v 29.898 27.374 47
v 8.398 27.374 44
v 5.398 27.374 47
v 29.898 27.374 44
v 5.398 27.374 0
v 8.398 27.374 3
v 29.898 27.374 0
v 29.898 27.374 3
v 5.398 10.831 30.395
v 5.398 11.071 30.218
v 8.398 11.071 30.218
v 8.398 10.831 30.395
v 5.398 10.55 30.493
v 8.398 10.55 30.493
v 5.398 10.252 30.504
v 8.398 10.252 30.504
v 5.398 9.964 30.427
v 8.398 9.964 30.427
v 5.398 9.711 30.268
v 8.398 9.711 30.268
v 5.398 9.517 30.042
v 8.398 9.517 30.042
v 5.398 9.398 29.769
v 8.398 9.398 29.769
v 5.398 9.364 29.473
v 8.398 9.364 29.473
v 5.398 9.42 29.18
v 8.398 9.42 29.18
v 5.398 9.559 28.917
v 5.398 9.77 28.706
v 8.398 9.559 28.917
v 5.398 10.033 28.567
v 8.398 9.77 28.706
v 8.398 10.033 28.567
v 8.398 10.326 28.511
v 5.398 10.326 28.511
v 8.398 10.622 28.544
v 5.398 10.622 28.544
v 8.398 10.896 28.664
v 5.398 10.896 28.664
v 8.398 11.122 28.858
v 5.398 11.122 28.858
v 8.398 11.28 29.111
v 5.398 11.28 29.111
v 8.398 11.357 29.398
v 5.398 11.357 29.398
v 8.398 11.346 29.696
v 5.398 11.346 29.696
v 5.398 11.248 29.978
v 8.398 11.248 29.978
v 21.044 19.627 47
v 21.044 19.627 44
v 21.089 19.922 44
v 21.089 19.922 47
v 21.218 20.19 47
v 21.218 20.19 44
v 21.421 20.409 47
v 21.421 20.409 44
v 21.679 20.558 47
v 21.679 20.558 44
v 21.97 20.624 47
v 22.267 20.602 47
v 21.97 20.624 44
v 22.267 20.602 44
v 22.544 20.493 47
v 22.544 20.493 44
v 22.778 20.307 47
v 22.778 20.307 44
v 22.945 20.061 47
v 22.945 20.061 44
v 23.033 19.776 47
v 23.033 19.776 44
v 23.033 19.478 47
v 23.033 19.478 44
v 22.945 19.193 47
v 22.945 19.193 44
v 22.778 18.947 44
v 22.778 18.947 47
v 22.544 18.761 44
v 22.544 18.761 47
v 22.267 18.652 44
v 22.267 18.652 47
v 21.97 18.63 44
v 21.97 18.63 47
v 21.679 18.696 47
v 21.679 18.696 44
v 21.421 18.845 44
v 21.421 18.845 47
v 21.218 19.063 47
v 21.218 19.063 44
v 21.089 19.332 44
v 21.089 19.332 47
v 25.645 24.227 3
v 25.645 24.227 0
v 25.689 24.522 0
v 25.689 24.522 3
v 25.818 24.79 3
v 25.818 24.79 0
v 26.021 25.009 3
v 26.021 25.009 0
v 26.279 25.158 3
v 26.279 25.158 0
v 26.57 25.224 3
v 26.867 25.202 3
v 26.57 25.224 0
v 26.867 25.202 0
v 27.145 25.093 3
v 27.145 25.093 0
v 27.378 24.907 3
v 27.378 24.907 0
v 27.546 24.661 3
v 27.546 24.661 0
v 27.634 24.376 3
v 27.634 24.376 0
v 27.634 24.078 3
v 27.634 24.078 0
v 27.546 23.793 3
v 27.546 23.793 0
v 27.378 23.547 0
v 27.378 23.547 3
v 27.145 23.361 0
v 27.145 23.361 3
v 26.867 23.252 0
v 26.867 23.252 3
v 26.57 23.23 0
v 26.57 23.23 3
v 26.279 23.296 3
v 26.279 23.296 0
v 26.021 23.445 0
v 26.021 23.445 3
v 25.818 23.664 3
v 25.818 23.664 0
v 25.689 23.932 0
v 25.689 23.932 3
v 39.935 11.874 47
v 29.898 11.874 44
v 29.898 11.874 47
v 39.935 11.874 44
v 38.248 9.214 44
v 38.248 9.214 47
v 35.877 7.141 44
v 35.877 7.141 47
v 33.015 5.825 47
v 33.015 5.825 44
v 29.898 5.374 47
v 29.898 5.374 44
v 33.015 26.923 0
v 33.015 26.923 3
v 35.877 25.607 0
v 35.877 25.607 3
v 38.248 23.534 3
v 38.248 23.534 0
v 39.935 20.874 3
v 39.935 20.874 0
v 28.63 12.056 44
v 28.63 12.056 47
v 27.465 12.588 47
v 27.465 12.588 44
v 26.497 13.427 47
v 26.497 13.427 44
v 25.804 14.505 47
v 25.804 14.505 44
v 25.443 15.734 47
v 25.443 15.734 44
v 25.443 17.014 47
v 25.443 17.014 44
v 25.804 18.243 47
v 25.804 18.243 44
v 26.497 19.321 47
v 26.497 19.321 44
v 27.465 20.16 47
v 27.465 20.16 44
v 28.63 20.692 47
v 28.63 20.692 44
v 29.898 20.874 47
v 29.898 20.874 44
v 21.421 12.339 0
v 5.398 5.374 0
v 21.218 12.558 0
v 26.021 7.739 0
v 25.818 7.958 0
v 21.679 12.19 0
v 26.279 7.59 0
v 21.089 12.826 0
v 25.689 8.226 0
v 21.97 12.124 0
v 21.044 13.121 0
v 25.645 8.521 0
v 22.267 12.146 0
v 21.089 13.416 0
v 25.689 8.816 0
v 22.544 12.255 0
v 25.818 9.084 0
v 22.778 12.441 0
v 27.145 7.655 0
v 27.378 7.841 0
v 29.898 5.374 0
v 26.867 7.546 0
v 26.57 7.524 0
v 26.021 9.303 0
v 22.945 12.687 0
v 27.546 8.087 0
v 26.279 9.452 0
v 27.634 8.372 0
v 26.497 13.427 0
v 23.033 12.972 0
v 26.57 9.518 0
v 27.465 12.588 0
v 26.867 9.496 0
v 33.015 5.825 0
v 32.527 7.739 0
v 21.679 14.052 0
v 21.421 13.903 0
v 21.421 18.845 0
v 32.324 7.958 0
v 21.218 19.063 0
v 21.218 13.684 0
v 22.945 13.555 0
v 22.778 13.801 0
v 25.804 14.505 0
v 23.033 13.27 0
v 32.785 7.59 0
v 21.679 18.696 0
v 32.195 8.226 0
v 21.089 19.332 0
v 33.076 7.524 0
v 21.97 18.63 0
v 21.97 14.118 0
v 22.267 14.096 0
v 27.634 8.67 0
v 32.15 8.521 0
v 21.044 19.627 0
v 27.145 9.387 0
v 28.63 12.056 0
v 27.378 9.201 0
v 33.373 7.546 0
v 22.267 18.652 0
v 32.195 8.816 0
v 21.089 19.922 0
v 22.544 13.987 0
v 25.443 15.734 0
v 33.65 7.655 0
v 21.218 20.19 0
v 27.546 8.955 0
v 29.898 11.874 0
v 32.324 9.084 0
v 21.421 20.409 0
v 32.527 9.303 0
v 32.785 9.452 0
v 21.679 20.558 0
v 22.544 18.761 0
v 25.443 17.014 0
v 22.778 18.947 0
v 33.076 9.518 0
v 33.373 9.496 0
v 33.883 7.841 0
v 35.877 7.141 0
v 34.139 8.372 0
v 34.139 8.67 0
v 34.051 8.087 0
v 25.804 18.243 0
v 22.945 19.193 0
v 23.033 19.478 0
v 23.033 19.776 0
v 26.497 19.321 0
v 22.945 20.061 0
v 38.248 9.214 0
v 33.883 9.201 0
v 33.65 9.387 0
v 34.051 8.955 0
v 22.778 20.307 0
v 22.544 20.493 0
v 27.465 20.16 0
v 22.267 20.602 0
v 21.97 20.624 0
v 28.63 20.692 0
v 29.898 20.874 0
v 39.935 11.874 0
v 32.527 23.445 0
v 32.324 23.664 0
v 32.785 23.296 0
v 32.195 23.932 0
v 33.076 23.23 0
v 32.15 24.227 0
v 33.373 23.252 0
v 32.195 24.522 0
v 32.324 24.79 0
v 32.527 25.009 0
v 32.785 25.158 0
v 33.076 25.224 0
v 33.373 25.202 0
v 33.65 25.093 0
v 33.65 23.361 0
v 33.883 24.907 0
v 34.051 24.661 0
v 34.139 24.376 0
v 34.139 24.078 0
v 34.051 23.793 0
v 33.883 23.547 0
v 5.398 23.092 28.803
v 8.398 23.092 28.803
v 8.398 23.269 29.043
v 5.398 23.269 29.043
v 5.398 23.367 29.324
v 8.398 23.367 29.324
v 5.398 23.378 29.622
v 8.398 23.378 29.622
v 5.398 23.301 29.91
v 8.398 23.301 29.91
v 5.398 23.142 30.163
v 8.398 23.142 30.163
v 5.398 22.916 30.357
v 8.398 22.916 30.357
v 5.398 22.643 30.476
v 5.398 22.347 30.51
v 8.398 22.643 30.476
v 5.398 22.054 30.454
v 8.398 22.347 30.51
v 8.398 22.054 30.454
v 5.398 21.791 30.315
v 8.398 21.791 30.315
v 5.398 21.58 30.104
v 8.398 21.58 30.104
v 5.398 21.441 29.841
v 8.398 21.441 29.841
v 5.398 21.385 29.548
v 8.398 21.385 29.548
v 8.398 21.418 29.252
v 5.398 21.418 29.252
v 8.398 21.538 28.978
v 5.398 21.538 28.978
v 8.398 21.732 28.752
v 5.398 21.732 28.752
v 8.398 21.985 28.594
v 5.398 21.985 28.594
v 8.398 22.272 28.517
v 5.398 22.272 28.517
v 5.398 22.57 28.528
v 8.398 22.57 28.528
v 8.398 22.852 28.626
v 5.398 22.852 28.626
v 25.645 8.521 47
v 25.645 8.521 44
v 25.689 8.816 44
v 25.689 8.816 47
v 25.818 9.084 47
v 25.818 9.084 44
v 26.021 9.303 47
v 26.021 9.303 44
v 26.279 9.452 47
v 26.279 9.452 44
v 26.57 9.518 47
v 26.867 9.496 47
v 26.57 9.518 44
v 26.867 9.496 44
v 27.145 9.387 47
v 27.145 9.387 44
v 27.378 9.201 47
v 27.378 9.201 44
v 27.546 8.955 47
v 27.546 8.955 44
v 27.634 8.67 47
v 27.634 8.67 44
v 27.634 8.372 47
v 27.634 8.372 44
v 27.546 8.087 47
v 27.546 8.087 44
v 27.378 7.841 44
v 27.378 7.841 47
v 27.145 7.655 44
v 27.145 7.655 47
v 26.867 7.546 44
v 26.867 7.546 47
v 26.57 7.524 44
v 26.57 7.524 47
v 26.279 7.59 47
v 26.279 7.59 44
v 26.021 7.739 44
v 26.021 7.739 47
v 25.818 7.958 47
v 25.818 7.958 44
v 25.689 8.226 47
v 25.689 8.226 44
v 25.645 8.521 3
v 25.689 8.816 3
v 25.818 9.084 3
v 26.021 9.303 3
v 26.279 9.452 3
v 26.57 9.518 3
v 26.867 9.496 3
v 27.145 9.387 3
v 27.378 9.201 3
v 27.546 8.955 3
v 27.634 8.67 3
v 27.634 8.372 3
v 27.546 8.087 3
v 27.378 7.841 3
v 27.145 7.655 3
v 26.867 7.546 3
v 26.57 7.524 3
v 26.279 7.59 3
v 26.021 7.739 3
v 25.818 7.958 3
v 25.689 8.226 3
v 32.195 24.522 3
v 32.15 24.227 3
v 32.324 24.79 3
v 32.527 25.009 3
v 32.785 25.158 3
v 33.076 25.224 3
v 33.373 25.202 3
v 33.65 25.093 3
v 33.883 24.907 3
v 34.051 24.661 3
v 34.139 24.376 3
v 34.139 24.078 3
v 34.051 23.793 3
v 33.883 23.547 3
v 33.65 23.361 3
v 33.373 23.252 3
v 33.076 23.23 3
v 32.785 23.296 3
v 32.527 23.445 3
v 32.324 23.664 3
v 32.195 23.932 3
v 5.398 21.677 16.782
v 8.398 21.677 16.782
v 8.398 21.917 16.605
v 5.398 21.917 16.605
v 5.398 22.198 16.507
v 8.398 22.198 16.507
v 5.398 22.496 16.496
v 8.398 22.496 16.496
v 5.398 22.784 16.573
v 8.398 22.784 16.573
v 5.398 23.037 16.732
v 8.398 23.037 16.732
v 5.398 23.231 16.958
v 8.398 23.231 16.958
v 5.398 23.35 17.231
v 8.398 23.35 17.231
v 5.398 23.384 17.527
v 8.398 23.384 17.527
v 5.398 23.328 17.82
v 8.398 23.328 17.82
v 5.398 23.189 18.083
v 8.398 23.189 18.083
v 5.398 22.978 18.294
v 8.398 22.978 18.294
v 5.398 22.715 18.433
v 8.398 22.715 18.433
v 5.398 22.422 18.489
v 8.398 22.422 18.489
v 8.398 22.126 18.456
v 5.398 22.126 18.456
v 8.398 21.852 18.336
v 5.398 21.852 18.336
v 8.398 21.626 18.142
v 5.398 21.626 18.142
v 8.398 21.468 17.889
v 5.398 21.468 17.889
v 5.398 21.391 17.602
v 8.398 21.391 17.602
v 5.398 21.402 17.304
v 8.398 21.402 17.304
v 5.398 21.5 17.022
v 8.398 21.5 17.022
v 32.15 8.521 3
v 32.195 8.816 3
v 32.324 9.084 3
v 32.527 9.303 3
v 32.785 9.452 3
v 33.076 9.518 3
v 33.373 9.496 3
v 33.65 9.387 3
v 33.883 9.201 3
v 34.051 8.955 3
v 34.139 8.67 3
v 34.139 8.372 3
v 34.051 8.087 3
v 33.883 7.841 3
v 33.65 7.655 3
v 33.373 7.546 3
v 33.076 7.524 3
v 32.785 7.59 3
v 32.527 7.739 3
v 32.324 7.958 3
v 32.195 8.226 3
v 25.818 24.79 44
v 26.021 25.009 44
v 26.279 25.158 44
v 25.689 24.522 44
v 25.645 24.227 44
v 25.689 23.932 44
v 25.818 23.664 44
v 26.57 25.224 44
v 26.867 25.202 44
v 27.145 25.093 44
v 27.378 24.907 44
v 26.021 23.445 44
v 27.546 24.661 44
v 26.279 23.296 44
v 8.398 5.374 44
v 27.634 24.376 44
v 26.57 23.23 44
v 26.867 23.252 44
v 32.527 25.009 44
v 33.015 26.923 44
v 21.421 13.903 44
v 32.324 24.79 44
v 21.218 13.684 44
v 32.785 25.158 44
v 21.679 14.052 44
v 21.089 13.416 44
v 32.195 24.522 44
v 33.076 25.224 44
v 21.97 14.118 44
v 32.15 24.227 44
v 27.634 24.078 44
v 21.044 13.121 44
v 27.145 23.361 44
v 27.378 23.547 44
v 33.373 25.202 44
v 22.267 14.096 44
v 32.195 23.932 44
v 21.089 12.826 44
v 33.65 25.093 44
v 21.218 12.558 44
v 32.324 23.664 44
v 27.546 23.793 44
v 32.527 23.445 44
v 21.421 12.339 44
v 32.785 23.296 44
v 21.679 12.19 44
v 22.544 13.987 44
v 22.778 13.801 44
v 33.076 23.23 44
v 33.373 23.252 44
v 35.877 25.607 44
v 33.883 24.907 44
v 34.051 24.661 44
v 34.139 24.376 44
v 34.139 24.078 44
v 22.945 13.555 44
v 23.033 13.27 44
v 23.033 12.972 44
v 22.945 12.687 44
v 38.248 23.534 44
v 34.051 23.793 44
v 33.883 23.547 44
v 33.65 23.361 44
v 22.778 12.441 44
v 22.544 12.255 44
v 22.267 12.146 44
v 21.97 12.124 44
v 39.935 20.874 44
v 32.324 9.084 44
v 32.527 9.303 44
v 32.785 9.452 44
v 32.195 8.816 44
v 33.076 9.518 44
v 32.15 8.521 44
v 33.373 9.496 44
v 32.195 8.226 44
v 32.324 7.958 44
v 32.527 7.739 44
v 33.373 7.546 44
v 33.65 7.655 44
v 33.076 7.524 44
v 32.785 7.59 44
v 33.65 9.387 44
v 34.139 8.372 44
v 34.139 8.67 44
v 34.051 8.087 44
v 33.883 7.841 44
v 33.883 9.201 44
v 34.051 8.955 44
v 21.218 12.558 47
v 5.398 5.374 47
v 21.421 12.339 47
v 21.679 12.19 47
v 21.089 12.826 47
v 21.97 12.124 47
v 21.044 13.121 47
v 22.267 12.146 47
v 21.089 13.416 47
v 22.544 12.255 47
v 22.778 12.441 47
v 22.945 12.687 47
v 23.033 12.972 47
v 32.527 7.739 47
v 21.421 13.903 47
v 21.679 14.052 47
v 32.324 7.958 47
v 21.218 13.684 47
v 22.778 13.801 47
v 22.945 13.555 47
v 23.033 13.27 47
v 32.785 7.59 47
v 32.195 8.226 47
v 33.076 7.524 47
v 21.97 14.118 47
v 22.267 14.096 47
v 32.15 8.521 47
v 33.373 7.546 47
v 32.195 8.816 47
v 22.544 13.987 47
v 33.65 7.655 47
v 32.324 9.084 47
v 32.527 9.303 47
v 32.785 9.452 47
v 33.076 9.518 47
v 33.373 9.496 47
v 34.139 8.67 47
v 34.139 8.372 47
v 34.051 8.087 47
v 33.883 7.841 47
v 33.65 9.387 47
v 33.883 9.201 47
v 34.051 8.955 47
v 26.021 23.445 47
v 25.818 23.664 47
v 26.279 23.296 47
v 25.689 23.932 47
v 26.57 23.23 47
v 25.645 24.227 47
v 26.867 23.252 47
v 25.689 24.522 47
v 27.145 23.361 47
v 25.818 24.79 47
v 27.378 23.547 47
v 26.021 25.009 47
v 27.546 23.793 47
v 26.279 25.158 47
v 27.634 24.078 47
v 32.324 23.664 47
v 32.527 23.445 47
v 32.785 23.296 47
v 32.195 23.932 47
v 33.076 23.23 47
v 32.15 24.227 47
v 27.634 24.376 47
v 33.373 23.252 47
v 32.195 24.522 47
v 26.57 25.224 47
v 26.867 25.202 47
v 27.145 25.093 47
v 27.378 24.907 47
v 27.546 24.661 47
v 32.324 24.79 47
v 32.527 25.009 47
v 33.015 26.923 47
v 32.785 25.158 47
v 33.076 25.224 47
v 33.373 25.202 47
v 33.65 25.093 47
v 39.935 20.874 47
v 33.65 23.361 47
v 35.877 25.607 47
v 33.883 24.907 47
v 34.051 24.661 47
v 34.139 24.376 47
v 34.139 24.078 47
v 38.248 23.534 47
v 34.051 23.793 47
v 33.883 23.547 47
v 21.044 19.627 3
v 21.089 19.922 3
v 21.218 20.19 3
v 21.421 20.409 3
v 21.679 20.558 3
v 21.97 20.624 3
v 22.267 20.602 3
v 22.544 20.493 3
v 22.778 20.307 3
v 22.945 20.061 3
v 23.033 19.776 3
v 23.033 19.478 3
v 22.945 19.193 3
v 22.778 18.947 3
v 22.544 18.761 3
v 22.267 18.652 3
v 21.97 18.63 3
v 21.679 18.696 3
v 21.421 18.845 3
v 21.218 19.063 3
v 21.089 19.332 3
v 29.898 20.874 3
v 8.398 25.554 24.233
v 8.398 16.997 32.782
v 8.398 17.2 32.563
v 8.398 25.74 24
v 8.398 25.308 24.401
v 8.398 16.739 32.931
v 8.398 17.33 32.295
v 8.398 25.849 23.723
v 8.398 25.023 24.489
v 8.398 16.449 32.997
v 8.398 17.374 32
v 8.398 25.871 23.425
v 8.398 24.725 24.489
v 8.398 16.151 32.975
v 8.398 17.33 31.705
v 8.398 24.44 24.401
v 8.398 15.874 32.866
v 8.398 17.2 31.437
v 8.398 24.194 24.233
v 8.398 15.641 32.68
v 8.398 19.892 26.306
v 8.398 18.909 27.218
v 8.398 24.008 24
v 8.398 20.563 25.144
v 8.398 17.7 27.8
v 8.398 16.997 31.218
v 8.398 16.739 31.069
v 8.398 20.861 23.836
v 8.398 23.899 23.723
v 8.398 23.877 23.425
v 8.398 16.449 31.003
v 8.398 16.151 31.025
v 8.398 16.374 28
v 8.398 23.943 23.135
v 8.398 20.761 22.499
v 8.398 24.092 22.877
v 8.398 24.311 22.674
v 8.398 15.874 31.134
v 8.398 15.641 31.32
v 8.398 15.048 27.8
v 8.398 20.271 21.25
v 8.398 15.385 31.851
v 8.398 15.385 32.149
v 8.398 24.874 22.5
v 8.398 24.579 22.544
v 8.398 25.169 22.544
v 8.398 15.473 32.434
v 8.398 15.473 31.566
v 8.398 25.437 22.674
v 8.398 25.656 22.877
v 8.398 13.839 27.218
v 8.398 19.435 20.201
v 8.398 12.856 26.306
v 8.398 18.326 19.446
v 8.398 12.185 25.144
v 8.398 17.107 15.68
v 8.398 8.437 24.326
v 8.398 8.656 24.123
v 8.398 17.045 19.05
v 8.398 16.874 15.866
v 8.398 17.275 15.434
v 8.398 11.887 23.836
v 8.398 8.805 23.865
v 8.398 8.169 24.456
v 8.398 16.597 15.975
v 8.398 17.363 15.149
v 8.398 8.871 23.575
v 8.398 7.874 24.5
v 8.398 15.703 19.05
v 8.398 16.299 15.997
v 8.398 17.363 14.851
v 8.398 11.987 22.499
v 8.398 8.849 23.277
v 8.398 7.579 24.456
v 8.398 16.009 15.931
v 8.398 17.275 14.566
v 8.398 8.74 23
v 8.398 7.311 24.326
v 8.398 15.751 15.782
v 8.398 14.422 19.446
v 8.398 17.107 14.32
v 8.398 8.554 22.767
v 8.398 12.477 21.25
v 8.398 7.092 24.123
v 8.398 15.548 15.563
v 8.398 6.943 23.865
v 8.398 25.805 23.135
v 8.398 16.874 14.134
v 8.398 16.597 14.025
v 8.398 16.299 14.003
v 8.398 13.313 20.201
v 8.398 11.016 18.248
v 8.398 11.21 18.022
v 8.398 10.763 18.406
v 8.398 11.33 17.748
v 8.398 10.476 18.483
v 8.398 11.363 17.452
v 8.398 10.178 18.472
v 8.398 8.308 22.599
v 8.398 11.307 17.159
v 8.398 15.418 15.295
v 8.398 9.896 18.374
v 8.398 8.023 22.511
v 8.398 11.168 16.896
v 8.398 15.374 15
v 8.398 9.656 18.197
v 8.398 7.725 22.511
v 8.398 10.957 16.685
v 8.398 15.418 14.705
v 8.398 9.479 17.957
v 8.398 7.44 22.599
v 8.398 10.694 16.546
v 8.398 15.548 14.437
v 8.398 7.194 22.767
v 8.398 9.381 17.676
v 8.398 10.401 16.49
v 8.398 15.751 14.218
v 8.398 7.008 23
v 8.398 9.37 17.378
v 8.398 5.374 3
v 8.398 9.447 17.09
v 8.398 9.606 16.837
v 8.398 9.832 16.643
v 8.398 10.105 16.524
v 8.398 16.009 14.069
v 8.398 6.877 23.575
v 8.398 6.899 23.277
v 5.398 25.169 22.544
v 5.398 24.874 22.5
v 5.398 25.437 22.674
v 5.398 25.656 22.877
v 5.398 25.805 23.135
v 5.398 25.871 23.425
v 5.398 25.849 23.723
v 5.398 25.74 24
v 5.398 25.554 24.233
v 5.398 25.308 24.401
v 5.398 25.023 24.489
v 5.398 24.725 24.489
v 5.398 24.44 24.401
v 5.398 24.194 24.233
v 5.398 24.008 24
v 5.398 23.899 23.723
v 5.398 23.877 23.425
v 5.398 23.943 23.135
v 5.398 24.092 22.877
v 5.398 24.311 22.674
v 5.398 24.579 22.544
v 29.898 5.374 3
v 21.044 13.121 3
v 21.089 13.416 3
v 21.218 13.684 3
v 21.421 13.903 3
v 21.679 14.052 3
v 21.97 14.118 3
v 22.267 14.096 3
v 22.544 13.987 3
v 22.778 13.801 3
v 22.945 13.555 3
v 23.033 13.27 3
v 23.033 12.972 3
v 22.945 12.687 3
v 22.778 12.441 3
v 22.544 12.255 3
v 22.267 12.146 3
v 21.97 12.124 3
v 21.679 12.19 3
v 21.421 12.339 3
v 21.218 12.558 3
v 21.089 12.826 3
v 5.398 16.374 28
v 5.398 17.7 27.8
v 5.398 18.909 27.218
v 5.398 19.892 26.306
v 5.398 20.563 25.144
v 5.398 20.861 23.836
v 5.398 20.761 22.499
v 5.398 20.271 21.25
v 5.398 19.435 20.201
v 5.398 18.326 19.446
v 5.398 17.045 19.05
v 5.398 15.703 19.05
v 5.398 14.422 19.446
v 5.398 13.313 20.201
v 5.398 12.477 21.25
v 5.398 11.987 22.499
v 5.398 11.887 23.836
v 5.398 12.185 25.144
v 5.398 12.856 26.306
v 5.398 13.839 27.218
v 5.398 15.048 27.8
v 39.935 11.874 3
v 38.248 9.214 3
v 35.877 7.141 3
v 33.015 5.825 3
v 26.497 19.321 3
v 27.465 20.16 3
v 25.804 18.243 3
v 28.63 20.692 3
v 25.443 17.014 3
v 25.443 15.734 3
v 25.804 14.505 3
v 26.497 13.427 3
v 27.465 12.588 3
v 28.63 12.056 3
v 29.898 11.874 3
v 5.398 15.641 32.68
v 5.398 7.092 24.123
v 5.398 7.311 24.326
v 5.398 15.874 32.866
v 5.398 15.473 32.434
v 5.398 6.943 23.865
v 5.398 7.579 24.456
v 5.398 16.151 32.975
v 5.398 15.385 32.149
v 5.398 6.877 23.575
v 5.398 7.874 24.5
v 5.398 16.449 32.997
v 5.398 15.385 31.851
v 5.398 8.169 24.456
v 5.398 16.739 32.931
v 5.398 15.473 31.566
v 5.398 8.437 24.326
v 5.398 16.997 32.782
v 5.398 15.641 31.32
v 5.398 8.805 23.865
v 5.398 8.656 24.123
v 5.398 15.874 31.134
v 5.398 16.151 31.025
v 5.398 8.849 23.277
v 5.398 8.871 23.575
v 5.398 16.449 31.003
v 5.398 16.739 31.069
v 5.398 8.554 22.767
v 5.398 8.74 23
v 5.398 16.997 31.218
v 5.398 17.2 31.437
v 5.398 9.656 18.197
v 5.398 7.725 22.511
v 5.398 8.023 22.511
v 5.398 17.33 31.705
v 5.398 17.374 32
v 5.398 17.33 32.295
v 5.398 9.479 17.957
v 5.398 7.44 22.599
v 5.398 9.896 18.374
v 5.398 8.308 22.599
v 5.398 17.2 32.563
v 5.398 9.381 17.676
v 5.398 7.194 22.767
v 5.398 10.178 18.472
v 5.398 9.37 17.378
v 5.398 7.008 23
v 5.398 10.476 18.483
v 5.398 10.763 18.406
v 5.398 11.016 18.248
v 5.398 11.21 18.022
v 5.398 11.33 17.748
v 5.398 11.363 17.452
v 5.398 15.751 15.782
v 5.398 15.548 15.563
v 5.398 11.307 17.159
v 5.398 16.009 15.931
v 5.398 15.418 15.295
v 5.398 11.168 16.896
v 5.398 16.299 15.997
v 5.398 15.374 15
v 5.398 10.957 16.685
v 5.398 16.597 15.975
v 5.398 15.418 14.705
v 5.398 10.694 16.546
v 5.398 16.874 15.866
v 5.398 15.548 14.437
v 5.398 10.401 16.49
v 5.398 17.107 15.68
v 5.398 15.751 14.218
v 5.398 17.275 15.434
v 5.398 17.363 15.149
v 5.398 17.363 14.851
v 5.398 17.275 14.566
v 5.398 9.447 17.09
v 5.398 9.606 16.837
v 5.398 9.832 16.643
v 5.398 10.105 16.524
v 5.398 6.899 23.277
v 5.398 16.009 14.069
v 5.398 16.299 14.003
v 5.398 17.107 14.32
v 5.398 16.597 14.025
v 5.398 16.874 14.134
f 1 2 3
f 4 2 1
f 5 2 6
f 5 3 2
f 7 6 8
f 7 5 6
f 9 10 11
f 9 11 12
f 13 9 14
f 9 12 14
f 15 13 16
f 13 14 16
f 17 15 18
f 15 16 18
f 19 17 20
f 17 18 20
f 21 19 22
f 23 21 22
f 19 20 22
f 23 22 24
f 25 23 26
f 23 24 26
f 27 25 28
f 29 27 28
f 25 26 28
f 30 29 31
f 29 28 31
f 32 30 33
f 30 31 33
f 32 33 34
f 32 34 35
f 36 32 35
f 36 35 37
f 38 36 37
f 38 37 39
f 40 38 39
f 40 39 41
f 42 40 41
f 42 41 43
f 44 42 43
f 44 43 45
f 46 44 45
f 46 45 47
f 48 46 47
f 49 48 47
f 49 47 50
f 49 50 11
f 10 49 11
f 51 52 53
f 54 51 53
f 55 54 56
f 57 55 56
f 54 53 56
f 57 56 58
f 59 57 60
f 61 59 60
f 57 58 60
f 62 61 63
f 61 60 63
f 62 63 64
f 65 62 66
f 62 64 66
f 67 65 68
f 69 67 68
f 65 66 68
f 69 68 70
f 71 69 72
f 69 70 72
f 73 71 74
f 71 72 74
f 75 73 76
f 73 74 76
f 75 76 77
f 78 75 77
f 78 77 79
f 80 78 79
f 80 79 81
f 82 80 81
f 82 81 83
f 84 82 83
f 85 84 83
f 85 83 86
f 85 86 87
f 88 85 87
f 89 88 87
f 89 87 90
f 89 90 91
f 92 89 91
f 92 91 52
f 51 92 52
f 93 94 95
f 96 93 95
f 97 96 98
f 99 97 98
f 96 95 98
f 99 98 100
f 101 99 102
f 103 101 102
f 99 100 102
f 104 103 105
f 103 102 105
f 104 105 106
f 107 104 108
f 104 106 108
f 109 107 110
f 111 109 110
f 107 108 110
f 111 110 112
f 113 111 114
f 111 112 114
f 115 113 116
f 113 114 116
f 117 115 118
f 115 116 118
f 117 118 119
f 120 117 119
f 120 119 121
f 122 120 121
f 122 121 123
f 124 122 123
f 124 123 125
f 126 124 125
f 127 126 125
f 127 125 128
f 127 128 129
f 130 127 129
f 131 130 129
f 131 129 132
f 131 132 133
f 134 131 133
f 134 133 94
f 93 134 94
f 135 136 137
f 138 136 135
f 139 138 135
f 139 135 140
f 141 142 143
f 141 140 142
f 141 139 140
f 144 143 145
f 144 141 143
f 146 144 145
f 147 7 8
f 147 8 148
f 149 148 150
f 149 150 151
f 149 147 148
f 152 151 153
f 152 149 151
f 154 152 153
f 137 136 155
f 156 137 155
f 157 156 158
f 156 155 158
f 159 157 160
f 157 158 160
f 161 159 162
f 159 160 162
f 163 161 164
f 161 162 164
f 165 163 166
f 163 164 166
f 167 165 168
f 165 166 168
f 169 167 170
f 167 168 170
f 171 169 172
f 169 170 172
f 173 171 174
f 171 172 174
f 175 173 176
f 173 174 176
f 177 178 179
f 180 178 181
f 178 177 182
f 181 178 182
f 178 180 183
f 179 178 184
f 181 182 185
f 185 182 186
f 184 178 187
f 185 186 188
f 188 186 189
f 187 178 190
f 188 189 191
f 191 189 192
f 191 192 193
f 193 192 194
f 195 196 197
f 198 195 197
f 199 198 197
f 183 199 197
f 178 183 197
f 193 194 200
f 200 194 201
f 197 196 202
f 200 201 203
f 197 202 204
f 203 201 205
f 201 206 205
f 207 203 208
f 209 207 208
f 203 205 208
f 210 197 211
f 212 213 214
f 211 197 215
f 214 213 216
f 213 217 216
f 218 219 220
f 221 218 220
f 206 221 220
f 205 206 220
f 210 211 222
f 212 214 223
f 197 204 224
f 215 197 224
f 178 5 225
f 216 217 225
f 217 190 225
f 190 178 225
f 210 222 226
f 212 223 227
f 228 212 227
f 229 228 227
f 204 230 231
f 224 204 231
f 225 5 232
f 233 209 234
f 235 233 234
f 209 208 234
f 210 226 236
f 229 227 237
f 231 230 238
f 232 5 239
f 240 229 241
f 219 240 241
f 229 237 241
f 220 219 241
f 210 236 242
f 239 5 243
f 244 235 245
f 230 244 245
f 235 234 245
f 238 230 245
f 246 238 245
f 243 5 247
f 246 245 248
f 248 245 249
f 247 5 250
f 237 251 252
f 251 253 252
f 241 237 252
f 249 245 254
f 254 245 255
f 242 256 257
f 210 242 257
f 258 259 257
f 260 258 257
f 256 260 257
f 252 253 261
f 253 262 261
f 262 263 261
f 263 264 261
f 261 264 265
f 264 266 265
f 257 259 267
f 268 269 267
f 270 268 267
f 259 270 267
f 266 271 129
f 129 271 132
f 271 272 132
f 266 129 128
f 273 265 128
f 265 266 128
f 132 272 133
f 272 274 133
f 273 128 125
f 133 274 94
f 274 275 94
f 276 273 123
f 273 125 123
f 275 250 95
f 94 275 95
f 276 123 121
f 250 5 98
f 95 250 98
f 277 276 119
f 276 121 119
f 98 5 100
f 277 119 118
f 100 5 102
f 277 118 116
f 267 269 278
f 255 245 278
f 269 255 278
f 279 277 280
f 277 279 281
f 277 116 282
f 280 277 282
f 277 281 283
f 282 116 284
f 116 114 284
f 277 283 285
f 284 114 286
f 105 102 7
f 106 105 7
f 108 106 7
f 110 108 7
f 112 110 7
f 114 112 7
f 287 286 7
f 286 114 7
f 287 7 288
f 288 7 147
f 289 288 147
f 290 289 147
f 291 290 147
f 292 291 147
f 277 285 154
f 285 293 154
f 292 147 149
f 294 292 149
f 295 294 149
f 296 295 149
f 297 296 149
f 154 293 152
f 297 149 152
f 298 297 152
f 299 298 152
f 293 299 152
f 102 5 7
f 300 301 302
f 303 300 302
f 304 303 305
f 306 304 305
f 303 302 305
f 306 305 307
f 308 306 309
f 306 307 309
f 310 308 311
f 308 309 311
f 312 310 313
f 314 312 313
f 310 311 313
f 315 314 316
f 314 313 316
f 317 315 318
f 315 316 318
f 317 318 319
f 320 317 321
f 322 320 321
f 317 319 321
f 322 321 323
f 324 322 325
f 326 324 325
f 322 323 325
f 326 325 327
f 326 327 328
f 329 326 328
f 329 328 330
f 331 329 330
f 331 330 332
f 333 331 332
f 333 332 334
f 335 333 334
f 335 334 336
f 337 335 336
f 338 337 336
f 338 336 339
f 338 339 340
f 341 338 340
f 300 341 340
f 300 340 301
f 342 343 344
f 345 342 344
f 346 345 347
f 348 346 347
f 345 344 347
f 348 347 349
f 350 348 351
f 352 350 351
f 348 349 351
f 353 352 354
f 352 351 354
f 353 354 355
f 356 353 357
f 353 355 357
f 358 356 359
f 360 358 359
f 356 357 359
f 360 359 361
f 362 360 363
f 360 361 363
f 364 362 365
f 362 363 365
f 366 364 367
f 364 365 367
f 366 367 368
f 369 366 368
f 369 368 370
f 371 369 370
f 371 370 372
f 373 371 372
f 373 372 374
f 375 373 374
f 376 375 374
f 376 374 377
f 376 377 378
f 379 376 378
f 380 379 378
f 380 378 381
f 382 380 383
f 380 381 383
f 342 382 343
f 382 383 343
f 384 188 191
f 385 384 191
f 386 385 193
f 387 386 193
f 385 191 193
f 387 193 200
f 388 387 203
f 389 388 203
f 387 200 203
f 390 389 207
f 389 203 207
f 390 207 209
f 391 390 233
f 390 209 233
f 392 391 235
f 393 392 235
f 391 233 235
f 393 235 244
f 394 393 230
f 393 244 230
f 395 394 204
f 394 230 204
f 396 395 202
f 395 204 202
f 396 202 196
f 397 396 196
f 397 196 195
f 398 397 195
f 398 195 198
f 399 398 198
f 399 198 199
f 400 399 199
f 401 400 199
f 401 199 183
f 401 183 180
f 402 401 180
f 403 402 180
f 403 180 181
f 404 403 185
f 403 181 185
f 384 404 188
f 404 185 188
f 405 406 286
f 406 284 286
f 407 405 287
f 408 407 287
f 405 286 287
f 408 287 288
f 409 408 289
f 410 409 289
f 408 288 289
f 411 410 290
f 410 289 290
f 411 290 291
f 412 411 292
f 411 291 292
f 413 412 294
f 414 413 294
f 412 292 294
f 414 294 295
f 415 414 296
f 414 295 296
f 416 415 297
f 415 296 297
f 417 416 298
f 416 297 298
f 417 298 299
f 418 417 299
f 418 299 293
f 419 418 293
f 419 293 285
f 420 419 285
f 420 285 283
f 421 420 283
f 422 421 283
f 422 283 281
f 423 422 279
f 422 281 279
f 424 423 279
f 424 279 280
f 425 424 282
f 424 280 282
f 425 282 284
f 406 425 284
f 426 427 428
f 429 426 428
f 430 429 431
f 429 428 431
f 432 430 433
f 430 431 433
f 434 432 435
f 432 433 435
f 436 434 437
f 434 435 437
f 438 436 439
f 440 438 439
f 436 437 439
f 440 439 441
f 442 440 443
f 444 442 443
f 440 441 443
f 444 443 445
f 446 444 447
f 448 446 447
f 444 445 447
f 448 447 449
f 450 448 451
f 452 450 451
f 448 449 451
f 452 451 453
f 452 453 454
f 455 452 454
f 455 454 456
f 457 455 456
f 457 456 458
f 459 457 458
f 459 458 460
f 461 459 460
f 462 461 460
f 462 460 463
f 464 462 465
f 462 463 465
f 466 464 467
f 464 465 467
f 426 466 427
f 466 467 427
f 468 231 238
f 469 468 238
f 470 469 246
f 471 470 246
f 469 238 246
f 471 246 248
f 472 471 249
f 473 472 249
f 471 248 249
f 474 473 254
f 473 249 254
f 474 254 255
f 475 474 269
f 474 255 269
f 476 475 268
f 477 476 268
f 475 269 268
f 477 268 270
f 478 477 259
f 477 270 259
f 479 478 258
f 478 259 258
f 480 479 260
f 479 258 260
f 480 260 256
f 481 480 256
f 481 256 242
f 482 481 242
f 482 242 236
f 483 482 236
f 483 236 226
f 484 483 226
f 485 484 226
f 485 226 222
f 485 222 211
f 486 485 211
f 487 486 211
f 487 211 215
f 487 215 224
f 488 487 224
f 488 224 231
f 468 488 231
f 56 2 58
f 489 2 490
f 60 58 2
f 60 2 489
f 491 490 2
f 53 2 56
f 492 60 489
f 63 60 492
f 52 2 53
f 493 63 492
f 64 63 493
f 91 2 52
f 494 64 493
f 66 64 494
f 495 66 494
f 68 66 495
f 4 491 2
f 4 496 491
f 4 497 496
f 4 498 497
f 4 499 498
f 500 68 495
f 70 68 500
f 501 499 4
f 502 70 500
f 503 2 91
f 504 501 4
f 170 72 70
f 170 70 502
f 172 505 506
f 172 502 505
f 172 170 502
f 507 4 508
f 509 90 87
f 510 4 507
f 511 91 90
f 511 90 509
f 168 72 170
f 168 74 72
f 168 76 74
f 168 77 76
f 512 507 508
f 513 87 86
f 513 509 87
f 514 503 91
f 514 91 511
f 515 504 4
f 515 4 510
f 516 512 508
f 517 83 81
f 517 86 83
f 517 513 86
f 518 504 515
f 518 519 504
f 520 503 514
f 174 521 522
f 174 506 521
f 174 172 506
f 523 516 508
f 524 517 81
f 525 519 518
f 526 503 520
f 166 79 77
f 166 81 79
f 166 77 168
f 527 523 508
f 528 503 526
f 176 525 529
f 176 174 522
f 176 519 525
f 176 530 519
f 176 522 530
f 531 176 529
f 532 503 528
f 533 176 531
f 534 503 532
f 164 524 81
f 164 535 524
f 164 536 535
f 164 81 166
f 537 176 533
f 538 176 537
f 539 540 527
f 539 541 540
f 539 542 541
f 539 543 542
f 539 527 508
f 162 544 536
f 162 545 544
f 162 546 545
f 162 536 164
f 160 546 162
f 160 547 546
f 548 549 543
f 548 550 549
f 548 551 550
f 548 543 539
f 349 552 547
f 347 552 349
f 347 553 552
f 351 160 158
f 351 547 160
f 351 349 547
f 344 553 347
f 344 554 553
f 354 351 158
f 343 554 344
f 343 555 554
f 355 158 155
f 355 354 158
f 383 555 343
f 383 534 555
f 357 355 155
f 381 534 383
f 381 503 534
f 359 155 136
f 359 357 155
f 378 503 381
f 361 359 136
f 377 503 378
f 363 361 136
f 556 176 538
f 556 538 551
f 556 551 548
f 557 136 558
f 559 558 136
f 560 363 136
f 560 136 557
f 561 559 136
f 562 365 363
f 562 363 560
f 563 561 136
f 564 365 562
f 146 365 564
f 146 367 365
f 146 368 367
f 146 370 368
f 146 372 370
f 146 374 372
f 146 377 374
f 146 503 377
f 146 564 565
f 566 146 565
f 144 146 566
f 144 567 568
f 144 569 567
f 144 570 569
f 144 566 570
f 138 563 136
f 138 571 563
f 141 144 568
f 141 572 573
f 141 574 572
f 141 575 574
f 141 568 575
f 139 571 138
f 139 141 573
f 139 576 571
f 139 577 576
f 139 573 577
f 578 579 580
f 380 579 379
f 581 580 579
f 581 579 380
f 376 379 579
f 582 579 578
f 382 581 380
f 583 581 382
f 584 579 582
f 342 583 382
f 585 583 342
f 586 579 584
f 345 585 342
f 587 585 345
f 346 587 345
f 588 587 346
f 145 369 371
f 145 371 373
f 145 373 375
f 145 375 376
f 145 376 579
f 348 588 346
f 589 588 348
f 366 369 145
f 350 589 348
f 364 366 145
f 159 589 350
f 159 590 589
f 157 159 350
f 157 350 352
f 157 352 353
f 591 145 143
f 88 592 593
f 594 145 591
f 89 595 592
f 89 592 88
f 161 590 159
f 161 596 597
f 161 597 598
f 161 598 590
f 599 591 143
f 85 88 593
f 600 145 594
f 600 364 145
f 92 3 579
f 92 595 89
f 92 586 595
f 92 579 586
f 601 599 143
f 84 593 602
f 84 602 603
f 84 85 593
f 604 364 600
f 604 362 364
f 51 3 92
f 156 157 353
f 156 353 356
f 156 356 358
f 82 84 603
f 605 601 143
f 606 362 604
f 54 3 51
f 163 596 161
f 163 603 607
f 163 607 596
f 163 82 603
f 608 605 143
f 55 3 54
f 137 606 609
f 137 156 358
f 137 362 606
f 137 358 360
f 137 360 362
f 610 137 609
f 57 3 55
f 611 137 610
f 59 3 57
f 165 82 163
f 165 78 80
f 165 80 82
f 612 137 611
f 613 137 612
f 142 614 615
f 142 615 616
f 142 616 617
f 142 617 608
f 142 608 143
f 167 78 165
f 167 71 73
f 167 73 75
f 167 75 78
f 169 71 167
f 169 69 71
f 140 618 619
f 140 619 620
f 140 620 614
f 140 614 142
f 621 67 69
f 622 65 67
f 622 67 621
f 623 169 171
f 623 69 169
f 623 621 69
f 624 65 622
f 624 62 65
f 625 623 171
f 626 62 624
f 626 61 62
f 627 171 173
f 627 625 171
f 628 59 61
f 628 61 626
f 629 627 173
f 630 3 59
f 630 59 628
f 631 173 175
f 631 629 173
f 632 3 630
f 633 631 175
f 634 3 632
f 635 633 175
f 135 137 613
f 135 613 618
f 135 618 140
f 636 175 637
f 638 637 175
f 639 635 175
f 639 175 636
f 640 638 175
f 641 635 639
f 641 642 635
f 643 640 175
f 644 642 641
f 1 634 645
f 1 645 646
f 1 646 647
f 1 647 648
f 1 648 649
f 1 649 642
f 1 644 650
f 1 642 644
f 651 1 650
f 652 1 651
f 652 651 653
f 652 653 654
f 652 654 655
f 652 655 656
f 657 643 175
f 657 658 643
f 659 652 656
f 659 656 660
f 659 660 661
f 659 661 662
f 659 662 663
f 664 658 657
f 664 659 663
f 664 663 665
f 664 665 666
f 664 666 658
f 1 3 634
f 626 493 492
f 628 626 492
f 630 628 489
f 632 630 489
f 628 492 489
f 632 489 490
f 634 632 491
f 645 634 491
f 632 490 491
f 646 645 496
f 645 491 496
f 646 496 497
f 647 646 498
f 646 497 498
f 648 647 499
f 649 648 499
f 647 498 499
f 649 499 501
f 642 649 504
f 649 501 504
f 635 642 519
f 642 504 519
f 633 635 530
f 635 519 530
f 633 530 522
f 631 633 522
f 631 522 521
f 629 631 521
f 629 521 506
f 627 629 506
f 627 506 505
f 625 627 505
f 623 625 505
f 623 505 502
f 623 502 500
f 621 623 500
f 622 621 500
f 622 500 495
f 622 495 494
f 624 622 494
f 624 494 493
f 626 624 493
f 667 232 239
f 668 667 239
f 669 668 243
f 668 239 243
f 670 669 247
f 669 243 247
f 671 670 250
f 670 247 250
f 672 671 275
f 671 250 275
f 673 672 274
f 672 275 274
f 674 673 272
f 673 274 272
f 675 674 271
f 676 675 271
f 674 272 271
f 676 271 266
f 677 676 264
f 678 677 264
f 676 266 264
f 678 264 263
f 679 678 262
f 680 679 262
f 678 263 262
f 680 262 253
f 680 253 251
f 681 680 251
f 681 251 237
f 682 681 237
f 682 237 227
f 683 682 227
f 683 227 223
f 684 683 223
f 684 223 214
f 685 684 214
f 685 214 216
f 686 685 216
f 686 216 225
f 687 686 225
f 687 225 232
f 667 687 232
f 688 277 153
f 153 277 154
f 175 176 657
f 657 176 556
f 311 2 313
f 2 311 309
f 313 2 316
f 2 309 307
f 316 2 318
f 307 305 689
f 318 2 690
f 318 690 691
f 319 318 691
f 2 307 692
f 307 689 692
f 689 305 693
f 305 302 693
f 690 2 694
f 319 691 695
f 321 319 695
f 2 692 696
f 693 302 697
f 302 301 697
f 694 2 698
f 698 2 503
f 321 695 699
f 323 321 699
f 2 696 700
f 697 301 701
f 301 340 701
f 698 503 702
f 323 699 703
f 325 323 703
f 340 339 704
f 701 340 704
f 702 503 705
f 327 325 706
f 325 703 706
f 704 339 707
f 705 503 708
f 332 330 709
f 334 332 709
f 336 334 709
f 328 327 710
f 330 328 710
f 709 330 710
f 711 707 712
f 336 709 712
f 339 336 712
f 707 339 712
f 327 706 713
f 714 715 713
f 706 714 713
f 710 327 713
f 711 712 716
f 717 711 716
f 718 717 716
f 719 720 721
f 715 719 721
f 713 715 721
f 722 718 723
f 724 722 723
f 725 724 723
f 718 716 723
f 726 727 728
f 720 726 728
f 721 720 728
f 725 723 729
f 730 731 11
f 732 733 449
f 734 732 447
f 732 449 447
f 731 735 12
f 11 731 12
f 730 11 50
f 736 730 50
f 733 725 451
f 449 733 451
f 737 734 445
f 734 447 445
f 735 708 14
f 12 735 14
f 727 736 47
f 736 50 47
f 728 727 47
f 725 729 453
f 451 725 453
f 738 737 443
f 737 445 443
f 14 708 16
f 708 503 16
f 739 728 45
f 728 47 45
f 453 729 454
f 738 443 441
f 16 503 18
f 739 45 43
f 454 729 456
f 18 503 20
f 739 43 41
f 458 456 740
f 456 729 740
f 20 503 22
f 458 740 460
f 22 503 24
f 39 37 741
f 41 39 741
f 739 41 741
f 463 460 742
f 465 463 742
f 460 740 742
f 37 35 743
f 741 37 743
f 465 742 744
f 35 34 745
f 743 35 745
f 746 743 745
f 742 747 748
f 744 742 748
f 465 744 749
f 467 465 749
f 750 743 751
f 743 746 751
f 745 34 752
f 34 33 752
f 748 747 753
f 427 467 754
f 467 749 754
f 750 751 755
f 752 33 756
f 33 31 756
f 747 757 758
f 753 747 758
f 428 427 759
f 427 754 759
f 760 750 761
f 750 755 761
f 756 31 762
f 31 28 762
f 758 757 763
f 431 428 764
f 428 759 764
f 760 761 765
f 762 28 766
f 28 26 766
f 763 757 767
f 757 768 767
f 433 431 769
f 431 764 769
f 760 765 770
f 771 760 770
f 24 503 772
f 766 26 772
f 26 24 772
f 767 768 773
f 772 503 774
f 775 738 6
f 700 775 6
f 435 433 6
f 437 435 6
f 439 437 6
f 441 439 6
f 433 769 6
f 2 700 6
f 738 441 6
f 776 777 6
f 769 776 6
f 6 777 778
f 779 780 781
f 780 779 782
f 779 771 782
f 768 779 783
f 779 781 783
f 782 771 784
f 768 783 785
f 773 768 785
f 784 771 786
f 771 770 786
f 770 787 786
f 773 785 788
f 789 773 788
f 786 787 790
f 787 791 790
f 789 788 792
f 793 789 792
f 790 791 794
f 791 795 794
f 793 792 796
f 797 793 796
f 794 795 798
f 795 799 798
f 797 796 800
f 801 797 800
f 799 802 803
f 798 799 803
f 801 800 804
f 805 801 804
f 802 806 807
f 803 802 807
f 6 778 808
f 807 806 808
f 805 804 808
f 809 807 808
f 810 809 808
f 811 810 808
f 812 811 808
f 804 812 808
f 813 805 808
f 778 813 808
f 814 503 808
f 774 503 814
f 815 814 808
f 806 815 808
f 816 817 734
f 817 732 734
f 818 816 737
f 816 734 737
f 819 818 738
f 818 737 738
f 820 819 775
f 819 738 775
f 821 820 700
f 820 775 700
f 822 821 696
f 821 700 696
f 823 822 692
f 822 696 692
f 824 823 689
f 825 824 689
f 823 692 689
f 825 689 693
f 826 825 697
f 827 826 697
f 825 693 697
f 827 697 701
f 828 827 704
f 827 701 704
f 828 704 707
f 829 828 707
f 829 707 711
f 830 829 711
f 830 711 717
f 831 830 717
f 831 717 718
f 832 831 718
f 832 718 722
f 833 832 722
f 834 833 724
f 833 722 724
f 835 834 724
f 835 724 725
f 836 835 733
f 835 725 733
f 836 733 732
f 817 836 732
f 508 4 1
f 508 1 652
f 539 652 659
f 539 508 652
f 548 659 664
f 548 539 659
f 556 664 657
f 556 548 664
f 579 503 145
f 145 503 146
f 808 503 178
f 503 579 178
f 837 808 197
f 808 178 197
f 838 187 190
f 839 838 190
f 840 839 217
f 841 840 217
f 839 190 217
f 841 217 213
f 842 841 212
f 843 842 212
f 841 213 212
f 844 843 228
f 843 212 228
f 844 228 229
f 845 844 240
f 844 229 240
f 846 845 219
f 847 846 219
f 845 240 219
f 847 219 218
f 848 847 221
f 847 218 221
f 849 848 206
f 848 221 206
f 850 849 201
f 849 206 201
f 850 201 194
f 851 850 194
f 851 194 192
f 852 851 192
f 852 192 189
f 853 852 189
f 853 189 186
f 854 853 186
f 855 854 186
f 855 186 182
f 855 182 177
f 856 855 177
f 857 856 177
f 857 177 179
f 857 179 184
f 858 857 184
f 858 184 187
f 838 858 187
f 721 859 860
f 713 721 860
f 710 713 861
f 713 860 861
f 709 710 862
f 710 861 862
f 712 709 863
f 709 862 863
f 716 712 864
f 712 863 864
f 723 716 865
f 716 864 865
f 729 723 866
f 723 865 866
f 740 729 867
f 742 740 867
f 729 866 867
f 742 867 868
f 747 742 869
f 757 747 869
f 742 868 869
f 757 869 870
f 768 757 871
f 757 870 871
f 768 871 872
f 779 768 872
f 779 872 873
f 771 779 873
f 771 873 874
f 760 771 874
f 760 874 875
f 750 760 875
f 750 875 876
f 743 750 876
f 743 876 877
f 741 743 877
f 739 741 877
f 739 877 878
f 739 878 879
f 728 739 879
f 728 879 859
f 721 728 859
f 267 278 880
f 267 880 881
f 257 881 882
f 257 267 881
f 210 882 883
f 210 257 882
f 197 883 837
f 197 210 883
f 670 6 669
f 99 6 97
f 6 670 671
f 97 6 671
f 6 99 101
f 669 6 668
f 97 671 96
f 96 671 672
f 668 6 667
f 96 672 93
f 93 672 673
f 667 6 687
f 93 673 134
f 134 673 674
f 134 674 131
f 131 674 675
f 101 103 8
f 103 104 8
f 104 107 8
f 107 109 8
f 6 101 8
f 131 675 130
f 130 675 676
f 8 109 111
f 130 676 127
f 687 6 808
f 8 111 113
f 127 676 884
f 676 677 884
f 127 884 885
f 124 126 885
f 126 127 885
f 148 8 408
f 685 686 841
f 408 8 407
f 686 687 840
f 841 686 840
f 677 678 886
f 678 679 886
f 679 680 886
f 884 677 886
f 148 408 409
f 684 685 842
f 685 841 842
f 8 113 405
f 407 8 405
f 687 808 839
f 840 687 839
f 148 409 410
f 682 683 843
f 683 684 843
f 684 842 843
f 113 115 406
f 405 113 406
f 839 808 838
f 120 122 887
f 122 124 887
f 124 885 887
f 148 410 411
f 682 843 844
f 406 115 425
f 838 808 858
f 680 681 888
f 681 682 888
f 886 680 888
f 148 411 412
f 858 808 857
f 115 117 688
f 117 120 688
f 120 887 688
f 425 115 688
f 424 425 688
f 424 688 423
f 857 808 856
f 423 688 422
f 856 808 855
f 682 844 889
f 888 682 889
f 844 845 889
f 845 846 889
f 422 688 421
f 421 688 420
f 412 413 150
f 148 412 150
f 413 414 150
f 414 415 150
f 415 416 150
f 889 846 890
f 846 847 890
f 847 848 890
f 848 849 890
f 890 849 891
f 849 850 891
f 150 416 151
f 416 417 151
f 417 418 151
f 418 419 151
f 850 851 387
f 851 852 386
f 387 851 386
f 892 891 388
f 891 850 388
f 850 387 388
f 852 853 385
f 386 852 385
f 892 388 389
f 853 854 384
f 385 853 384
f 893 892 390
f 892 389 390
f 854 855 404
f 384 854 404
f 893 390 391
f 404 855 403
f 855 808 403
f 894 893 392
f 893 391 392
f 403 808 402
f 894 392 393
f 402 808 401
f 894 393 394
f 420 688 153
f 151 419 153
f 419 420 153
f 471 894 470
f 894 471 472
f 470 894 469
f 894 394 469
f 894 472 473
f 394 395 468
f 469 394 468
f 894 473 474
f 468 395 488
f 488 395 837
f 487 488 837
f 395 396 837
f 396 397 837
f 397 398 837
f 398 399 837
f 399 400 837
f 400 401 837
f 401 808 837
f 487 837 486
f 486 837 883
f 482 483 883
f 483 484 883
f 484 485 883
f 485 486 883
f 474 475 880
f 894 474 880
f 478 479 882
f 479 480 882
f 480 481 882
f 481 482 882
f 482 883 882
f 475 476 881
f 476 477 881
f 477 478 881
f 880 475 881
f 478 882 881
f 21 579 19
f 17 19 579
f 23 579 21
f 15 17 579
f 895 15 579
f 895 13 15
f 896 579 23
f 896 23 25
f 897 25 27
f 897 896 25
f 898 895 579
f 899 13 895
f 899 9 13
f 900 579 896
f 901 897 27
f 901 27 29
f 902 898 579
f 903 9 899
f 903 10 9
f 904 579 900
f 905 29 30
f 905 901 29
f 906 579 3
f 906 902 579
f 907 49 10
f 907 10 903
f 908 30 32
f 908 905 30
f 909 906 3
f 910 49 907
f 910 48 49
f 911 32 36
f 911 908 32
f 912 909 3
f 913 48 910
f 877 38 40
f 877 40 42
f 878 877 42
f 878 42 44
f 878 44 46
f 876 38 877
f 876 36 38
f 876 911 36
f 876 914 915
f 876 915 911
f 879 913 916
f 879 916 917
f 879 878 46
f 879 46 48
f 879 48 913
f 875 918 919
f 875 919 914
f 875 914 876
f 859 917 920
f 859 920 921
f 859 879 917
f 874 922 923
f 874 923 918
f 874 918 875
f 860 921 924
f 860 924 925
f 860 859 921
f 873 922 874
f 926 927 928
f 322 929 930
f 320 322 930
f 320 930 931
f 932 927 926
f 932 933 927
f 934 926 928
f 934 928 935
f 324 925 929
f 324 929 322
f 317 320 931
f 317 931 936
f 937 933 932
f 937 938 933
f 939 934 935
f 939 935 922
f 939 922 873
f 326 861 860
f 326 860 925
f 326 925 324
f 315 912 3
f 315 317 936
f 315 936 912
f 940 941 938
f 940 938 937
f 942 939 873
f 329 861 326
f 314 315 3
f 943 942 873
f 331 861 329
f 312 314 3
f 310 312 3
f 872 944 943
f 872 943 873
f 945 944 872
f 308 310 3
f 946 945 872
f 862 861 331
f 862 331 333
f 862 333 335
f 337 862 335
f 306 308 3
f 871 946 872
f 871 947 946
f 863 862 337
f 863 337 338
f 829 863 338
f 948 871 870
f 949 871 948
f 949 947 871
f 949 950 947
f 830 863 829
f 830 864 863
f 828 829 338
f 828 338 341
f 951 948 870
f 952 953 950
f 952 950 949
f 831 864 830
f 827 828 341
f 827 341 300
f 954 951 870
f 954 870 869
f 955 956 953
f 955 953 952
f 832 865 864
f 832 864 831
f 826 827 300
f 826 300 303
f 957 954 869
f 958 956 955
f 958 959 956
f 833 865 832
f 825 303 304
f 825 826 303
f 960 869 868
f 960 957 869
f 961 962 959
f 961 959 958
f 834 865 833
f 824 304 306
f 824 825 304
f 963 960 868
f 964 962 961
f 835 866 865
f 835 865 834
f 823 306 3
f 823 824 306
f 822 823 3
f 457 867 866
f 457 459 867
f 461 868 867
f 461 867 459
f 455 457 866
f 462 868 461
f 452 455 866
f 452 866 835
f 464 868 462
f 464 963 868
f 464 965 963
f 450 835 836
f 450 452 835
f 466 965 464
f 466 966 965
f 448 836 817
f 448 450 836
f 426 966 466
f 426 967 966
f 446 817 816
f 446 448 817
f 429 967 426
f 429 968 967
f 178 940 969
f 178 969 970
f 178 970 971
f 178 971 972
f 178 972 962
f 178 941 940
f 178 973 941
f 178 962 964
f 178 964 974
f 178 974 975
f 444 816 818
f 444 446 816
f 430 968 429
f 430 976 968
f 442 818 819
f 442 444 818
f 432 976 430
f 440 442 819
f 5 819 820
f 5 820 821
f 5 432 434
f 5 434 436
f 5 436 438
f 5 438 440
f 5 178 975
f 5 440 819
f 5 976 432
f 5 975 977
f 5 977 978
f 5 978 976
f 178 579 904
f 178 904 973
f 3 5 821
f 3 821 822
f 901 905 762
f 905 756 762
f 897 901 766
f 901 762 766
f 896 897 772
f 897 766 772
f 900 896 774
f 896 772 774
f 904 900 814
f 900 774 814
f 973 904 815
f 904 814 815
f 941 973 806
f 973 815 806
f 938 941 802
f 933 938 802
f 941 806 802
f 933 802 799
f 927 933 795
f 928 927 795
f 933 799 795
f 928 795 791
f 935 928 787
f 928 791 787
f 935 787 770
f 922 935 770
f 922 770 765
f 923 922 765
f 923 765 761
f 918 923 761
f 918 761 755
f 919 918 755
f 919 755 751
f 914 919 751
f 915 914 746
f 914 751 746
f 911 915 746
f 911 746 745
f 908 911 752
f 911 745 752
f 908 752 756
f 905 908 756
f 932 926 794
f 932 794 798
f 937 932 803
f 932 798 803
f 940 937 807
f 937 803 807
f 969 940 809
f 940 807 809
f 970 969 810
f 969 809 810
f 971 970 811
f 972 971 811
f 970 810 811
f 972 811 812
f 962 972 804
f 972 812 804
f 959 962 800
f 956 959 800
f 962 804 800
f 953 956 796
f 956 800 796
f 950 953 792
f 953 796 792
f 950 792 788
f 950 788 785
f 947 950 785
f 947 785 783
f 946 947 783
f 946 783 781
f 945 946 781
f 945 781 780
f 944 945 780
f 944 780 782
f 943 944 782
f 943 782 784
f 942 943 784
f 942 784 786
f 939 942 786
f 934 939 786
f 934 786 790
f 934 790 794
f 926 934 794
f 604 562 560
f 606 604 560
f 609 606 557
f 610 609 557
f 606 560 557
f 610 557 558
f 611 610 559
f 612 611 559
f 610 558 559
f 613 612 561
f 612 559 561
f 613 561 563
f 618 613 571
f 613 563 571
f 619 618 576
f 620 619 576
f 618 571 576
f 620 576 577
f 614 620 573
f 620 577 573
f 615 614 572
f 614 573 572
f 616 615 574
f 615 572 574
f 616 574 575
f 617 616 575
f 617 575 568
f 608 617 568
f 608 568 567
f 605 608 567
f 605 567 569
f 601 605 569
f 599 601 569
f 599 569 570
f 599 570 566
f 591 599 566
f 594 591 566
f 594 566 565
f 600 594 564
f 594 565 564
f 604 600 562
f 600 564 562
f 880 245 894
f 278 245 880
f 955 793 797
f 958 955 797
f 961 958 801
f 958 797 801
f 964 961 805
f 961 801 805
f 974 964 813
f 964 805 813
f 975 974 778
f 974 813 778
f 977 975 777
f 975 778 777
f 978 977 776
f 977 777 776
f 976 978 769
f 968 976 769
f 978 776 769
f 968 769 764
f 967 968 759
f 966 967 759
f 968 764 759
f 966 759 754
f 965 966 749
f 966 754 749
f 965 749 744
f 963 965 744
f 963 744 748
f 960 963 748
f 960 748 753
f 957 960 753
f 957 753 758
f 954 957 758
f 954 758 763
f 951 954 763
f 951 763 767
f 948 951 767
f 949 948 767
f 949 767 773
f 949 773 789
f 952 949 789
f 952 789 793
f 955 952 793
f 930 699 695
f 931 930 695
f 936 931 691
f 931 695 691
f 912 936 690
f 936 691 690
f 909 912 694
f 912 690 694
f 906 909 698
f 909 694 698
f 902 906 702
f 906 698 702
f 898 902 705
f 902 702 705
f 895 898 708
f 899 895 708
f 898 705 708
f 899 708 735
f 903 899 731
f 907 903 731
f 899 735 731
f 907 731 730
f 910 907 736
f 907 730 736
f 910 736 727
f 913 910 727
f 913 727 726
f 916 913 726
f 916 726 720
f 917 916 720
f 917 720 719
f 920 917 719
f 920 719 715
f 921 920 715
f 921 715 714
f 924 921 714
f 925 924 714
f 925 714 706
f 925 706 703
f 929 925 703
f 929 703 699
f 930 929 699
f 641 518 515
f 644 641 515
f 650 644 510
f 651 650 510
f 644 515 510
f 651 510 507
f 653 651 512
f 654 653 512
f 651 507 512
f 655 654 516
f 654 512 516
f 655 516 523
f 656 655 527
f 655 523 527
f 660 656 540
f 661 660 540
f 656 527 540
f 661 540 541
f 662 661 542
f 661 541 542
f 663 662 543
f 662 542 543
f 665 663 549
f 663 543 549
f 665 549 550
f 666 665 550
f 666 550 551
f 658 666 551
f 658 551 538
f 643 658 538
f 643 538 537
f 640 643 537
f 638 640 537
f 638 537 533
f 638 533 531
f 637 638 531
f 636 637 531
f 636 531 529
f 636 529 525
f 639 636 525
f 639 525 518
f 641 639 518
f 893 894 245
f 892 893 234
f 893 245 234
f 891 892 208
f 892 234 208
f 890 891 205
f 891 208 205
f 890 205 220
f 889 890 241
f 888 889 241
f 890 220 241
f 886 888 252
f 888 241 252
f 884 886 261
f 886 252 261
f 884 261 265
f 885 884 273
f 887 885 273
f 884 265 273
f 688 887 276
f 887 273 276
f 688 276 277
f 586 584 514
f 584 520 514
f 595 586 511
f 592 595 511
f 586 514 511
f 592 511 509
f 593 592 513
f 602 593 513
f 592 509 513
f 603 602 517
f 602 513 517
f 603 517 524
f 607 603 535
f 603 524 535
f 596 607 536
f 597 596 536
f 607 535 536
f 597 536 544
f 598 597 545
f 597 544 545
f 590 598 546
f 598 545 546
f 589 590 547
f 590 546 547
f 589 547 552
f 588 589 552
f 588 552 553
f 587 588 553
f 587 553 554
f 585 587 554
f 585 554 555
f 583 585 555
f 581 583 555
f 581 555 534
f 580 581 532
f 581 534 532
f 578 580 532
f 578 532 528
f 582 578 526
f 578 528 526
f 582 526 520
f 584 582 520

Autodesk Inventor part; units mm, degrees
ref_plane "YZ Plane" through (0, 0, 0) normal (1, 0, 0) x (0, 1, 0)
ref_plane "XZ Plane" through (0, 0, 0) normal (0, 1, 0) x (-1, 0, 0)
ref_plane "XY Plane" through (0, 0, 0) normal (0, 0, 1) x (1, 0, 0)
sketch "Sketch1" plane through (0, 0, 0) normal (0, 0, 1) x (1, 0, 0)
  line L0 (5.3975, 5.374) -> (29.8975, 5.374)
  line L1 (5.3975, 27.374) -> (29.8975, 27.374)
  line L2 (5.3975, 5.374) -> (5.3975, 27.374)
  arc A0 (29.8975, 20.874) -> (29.8975, 11.874) centre (29.8975, 16.374) ccw
  line L3 (29.8975, 20.874) -> (39.9349, 20.874)
  line L4 (29.8975, 11.874) -> (39.9349, 11.874)
  arc A1 (29.8975, 5.374) -> (39.9349, 11.874) centre (29.8975, 16.374) ccw
  arc A2 (39.9349, 20.874) -> (29.8975, 27.374) centre (29.8975, 16.374) ccw
  point P0 (0, 0)
  dimension "d0" = 9
extrude "Extrusion1" add sketch "Sketch1" along normal blind 47
sketch "Sketch2" plane through (5.3975, 5.374, 0) normal (0, -1, 0) x (1, 0, 0)
  line L0 (24.5, 47) -> (0, 47) projected
  line L1 (0, 0) -> (0, 47) projected
  line L2 (24.5, 0) -> (24.5, 47) projected
  line L3 (3, 44) -> (34.5374, 44)
  line L4 (34.5374, 0) -> (34.5374, 47) projected
  line L5 (34.5374, 44) -> (34.5374, 3)
  line L6 (3, 44) -> (3, 3)
  line L7 (3, 3) -> (34.5374, 3)
  line L8 (34.5374, 0) -> (24.5, 0) projected
  point P0 (-5.3975, 0)
  dimension "d3" = 3
  dimension "d4" = 3
  dimension "d5" = 3
extrude "Extrusion2" cut sketch "Sketch2" against normal through all contours L7 L6 L3 L2 | L2 L3 L4 L7
sketch "Sketch3" plane through (5.3975, 5.374, 0) normal (-1, 0, 0) x (0, 0, 1)
  circle A0 centre (23.5, 11) radius 4.5
  point P0 (0, -5.374)
  dimension "d8" = 9
extrude "Extrusion3" cut sketch "Sketch3" against normal through all
sketch "Sketch4" plane through (0, 0, 0) normal (0, 0, -1) x (-1, 0, 0)
  line L0 (-5.3975, 5.374) -> (-29.8975, 5.374) projected
  arc A0 (-29.8975, 27.374) -> (-39.9349, 20.874) centre (-29.8975, 16.374) ccw projected
  arc A1 (-29.8975, 11.874) -> (-29.8975, 20.874) centre (-29.8975, 16.374) ccw projected
  arc A2 (-39.9349, 11.874) -> (-29.8975, 5.374) centre (-29.8975, 16.374) ccw projected
  circle A3 centre (-22.0445, 19.6268) radius 1
  line L1 (-29.8975, 16.374) -> (-22.0445, 19.6268)
  circle A4 centre (-26.6447, 24.2269) radius 1
  circle A5 centre (-33.1503, 24.2269) radius 1
  circle A6 centre (-37.7505, 19.6268) radius 1
  circle A7 centre (-37.7505, 13.1211) radius 1
  circle A8 centre (-33.1503, 8.521) radius 1
  circle A9 centre (-26.6447, 8.521) radius 1
  circle A10 centre (-22.0445, 13.1211) radius 1
  point P0 (0, 0)
  dimension "d11" = 2
  dimension "d12" = 8.5
  dimension "d13" = 22.5
  dimension "d16" = 360
extrude "Extrusion4" cut sketch "Sketch4" against normal through all contours A3 | A4 | A5 | A8 | A9 | A10
sketch "Sketch5" plane through (8.3975, 5.374, 44) normal (1, 0, 0) x (0, 0, -1)
  circle A0 centre (20.5, 11) radius 4.5 projected
  circle A1 centre (20.5, 19.5) radius 1
  point P0 (44, -5.374)
  dimension "d20" = 2
  dimension "d21" = 8.5
extrude "Extrusion5" cut sketch "Sketch5" against normal through all contours A1
pattern_circular "Circular Pattern1" count 8 over 360 about axis through (5.3975, 16.374, 23.5) along (1, 0, 0) of "Extrusion5"
properties part number "Shoulder" material "Aluminum-6061"
